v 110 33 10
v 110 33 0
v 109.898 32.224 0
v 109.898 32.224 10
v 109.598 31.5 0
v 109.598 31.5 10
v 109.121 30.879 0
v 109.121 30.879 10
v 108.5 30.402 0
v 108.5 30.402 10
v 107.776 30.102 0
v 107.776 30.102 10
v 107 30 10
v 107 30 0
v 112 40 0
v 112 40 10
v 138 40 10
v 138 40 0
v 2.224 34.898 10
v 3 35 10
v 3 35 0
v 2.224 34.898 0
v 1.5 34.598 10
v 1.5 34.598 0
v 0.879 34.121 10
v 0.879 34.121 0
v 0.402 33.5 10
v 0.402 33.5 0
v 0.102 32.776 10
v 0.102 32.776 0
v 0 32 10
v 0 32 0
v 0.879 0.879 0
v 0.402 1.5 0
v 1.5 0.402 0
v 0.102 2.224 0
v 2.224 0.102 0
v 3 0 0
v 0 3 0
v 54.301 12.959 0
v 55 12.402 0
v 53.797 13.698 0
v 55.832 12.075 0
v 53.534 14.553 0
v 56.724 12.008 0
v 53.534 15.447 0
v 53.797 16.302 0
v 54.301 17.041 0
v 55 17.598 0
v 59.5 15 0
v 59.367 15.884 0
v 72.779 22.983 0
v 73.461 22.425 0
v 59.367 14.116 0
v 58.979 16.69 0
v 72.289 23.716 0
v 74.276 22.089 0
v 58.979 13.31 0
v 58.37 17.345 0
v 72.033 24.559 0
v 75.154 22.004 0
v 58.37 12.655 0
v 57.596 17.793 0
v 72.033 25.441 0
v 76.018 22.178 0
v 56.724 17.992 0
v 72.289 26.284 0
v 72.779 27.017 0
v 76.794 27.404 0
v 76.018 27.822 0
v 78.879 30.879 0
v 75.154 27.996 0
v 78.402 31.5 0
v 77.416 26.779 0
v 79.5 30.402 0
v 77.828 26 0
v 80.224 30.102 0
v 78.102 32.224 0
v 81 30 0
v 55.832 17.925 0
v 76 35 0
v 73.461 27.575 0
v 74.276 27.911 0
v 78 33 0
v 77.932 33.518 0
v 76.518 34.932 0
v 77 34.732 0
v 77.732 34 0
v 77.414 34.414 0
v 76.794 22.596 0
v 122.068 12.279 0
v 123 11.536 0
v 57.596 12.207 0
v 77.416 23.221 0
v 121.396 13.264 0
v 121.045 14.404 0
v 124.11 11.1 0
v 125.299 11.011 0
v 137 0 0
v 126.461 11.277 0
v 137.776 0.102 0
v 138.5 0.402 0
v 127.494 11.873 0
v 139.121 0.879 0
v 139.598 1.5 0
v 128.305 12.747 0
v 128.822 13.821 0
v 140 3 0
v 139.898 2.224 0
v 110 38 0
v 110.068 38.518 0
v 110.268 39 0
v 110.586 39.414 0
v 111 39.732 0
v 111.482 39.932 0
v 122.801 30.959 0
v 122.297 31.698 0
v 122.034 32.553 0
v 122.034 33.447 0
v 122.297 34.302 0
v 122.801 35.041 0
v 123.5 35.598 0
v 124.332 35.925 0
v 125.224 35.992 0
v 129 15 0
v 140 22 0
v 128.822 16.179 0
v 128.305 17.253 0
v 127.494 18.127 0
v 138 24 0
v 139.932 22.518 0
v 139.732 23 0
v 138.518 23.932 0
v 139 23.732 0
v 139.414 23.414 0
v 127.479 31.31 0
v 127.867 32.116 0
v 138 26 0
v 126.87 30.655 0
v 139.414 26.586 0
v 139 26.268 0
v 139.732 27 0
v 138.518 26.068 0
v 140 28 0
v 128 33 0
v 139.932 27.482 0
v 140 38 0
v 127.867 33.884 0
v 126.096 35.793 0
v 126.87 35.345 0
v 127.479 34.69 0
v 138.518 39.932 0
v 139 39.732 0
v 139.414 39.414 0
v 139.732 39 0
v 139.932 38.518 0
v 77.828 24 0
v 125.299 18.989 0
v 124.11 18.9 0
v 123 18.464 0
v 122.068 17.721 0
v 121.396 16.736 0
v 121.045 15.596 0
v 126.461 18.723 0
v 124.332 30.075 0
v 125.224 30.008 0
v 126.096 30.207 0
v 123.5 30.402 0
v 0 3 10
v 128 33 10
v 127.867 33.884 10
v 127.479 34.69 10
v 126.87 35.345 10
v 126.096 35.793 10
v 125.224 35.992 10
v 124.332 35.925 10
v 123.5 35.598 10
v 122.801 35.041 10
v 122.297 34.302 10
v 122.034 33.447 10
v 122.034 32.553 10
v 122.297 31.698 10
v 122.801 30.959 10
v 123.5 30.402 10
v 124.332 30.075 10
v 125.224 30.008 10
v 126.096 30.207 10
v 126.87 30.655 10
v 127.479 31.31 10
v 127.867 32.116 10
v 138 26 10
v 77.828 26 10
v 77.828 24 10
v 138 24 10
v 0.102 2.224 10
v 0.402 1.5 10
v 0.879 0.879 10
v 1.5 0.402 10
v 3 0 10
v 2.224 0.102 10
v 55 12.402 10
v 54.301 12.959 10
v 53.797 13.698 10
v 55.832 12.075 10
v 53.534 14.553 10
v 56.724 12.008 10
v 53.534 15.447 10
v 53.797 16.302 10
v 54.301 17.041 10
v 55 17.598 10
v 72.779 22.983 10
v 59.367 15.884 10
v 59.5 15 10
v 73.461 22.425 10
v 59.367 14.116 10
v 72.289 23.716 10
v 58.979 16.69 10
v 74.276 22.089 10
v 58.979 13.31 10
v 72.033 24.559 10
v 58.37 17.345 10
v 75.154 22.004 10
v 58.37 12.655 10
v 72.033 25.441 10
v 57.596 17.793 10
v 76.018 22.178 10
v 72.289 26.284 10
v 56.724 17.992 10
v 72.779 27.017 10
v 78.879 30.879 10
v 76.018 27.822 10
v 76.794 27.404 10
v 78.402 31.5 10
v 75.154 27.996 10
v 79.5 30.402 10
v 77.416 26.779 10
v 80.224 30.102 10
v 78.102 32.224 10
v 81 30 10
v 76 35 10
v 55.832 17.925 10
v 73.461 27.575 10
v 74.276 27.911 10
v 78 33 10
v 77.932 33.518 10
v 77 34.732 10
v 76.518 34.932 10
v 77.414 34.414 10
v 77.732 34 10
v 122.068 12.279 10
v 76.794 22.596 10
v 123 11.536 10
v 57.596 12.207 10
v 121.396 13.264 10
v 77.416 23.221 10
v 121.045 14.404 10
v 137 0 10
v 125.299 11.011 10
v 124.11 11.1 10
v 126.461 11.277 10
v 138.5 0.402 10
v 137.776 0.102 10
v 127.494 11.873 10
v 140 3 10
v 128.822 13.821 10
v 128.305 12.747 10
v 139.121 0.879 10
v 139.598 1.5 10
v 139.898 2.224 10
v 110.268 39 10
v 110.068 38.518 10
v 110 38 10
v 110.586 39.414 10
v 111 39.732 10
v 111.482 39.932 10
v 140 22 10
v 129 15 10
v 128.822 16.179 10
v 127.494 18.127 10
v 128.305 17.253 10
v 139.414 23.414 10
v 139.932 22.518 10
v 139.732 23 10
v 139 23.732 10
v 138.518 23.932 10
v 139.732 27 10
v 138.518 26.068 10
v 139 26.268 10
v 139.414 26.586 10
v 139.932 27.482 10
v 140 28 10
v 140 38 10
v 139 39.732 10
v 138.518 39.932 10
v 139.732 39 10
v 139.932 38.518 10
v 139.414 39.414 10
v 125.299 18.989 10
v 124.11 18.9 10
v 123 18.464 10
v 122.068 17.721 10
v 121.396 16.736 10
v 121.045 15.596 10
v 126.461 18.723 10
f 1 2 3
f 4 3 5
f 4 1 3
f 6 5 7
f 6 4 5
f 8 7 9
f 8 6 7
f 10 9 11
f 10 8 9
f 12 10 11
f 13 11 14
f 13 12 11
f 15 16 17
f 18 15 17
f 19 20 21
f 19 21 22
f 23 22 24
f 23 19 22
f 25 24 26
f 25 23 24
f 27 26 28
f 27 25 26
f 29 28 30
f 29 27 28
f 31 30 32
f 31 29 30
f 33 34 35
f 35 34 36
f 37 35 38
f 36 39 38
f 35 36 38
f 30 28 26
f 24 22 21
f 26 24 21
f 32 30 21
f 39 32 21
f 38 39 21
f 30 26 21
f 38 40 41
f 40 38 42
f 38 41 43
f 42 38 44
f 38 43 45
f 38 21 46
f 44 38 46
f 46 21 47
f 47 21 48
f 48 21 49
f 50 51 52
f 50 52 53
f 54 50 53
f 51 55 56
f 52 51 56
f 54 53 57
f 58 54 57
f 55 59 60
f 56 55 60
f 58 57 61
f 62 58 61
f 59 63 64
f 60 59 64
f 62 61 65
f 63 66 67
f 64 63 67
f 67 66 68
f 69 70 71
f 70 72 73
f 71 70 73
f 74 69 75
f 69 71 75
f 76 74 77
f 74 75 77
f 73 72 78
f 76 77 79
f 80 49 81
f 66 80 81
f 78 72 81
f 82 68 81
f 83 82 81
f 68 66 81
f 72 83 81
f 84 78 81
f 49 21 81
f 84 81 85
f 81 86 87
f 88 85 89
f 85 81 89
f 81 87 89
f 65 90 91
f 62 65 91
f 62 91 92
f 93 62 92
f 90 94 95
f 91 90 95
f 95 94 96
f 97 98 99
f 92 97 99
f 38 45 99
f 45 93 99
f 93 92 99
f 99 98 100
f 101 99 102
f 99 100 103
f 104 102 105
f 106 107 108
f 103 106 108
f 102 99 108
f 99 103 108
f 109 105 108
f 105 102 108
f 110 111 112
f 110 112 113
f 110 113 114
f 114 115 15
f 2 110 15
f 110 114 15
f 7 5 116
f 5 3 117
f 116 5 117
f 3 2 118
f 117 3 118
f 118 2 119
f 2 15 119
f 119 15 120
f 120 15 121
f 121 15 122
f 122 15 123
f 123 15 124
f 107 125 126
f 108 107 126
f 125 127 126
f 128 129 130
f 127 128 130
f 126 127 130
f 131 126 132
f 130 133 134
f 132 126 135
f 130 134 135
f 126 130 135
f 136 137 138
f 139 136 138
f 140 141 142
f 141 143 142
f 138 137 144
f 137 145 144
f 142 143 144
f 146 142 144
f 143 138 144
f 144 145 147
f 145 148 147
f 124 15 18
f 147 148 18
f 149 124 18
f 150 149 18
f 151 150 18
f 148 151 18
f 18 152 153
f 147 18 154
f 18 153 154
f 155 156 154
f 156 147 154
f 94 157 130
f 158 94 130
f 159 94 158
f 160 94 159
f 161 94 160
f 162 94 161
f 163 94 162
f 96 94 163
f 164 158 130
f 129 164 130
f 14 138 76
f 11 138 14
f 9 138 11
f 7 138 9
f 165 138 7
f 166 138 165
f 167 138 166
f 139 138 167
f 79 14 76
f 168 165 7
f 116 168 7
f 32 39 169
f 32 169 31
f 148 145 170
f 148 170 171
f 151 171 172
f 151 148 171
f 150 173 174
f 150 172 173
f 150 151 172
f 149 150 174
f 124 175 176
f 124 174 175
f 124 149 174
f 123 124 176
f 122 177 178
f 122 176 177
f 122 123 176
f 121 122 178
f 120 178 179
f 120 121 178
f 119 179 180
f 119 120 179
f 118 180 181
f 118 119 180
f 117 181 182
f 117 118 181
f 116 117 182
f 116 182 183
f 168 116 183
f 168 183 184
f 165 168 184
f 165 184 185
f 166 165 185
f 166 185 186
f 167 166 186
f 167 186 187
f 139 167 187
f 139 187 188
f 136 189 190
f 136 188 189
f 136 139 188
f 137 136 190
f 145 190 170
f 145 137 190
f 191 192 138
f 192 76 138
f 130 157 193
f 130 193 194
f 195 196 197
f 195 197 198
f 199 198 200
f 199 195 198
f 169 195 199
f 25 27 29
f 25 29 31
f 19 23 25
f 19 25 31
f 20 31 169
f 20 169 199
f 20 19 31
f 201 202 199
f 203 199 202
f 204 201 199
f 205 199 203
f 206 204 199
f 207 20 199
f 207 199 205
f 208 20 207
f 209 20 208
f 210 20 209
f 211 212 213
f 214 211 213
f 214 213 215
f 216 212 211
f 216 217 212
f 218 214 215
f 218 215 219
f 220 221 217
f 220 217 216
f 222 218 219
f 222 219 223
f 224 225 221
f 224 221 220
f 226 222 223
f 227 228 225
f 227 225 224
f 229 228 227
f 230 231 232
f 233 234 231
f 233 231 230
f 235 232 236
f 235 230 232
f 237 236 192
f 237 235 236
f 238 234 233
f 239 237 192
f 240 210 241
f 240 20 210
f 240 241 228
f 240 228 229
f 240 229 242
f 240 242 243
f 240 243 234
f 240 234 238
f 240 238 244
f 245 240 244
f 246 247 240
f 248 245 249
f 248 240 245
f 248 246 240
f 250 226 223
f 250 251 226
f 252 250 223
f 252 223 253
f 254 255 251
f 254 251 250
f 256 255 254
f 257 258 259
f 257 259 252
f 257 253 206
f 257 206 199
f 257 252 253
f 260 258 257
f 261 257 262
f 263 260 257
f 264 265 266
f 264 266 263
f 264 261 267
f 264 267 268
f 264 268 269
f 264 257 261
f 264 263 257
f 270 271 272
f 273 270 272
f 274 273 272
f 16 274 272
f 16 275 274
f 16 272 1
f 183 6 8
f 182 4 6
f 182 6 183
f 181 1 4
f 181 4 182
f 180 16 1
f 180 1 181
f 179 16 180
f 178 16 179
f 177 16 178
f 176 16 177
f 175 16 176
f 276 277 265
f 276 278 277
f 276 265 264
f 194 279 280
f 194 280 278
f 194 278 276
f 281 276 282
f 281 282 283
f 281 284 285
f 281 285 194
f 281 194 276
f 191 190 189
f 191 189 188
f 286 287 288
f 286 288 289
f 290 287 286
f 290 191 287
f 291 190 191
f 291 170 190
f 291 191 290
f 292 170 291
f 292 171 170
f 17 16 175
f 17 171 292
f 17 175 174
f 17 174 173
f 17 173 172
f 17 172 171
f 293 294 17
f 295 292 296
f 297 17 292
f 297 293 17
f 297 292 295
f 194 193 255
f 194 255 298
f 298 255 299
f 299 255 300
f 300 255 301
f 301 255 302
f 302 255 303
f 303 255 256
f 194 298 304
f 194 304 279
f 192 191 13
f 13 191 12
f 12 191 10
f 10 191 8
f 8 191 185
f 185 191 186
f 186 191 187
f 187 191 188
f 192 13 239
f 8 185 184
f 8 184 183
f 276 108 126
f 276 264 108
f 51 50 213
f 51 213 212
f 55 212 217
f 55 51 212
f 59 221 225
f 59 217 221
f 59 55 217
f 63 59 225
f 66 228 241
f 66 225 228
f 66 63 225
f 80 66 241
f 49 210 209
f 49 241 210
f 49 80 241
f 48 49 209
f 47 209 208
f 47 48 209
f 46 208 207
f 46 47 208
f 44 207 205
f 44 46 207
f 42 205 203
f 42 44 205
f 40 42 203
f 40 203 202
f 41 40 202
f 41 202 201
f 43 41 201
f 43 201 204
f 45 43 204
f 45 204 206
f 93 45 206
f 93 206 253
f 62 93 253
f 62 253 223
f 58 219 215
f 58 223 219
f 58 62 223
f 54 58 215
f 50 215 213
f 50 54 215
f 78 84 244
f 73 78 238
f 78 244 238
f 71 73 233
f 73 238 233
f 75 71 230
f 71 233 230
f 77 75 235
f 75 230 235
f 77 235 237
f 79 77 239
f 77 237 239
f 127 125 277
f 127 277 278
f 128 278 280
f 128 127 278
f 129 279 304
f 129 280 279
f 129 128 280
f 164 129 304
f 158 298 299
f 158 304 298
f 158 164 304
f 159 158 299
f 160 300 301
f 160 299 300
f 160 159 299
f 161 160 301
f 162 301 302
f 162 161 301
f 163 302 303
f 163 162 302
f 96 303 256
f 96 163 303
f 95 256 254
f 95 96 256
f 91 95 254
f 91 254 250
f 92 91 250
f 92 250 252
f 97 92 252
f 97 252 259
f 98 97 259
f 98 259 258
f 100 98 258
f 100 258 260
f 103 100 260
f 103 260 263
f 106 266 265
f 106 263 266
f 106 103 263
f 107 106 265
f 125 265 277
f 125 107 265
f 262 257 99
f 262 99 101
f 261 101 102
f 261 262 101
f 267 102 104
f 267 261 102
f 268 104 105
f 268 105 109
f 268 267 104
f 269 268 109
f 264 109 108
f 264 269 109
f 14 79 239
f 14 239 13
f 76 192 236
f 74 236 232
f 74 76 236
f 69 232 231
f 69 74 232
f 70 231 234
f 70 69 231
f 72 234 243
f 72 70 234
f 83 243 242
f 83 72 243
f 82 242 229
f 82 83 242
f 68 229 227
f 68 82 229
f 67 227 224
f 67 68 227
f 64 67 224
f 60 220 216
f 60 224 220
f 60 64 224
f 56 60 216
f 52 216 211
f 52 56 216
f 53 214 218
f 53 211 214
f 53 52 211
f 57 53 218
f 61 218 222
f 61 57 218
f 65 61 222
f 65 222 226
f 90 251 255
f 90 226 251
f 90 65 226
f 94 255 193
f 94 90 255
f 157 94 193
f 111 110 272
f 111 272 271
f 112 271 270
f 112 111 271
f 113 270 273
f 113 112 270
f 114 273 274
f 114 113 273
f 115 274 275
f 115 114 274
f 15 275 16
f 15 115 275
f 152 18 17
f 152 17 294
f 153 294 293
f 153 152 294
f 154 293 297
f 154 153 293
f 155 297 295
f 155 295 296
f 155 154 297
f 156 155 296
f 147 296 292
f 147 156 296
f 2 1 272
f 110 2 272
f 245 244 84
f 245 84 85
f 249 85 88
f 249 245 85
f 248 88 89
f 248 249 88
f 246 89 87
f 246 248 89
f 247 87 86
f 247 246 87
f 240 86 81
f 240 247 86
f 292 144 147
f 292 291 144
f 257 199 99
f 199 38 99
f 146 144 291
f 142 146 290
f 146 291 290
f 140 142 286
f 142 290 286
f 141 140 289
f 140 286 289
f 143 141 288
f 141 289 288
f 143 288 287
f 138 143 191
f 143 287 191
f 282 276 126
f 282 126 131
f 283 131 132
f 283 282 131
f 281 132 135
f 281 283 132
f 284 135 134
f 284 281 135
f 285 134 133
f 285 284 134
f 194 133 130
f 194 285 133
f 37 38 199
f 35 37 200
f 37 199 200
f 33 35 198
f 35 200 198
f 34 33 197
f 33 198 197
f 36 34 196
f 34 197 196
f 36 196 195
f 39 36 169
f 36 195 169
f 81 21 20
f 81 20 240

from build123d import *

# Parameters (mm, degrees)
ESQUISSE1_W                  = 140
ESQUISSE1_H                  = 35
BOSS_EXTRU_1_DEPTH           = 30
ESQUISSE2_W                  = 33
ESQUISSE2_H                  = 35
ENL_V_MAT_EXTRU_1_DEPTH      = 20
ESQUISSE3_W                  = 30
ESQUISSE3_H                  = 5
BOSS_EXTRU_2_DEPTH           = 30
ENL_V_MAT_EXTRU_2_DEPTH      = 149.660687473
ENL_V_MAT_EXTRU_2_DEPTH_BACK = 149.660687473
ESQUISSE4_R                  = 3
ENL_V_MAT_EXTRU_3_DEPTH      = 149.660687473
ENL_V_MAT_EXTRU_3_DEPTH_BACK = 149.660687473
ESQUISSE5_W                  = 65
ESQUISSE5_H                  = 2
ENL_V_MAT_EXTRU_4_DEPTH      = 149.660687473
ENL_V_MAT_EXTRU_4_DEPTH_BACK = 149.660687473
ESQUISSE6_W                  = 32
ESQUISSE6_H                  = 5
CONG_1_R                     = 3
ENL_V_MAT_EXTRU_6_DEPTH      = 15
ENL_V_MAT_EXTRU_5_DEPTH      = 149.660687473
ENL_V_MAT_EXTRU_5_DEPTH_BACK = 149.660687473
ESQUISSE7_R                  = 4
CONG_2_R                     = 3
CONG_3_R                     = 2
ENL_V_MAT_EXTRU_8_DEPTH      = 149.660687473
ENL_V_MAT_EXTRU_8_DEPTH_BACK = 149.660687473
ESQUISSE10_R                 = 3
ESQUISSE9_W                  = 140
ESQUISSE9_H                  = 40
ENL_V_MAT_EXTRU_7_DEPTH      = 20


with BuildPart() as part:
    # Esquisse1 → Boss.-Extru.1 (new body)
    with BuildSketch(Plane.XY):
        with Locations((70, 17.5)):
            Rectangle(ESQUISSE1_W, ESQUISSE1_H)
    extrude(amount=BOSS_EXTRU_1_DEPTH)

    # Esquisse2 → Enlèv. mat.-Extru.1 (cut)
    with BuildSketch(Plane.XY.offset(30)):
        with Locations((25, 17.5)):
            Rectangle(ESQUISSE2_W, ESQUISSE2_H)
    extrude(amount=-ENL_V_MAT_EXTRU_1_DEPTH, mode=Mode.SUBTRACT)

    # Esquisse3 → Boss.-Extru.2 (add)
    with BuildSketch(Plane.XY.offset(30)):
        with Locations((125, 37.5)):
            Rectangle(ESQUISSE3_W, ESQUISSE3_H)
    extrude(amount=-BOSS_EXTRU_2_DEPTH)

    # Esquisse4 → Enlèv. mat.-Extru.2 (cut, two sides: drawn at the far end of the back side and taken through both)
    with BuildSketch(Plane.XY.offset(30).offset(-ENL_V_MAT_EXTRU_2_DEPTH_BACK)):
        with Locations((75, 25)):
            Circle(ESQUISSE4_R)
    extrude(amount=ENL_V_MAT_EXTRU_2_DEPTH + ENL_V_MAT_EXTRU_2_DEPTH_BACK, mode=Mode.SUBTRACT)

    # Esquisse5 → Enlèv. mat.-Extru.3 (cut, two sides: drawn at the far end of the back side and taken through both)
    with BuildSketch(Plane.XY.offset(30).offset(-ENL_V_MAT_EXTRU_3_DEPTH_BACK)):
        with Locations((107.5, 25)):
            Rectangle(ESQUISSE5_W, ESQUISSE5_H)
    extrude(amount=ENL_V_MAT_EXTRU_3_DEPTH + ENL_V_MAT_EXTRU_3_DEPTH_BACK, mode=Mode.SUBTRACT)

    # Esquisse6 → Enlèv. mat.-Extru.4 (cut, two sides: drawn at the far end of the back side and taken through both)
    with BuildSketch(Plane.XY.offset(30).offset(-ENL_V_MAT_EXTRU_4_DEPTH_BACK)):
        with Locations((94, 32.5)):
            Rectangle(ESQUISSE6_W, ESQUISSE6_H)
    extrude(amount=ENL_V_MAT_EXTRU_4_DEPTH + ENL_V_MAT_EXTRU_4_DEPTH_BACK, mode=Mode.SUBTRACT)

    # Congé1
    cong_1_edges = [part.edges().sort_by_distance(p)[0] for p in [
        (78, 30, 15),
        (110, 30, 15),
    ]]
    fillet(cong_1_edges, radius=CONG_1_R)

    # Esquisse8 → Enlèv. mat.-Extru.6 (cut)
    with BuildSketch(Plane.XY.offset(30)):
        Polygon((72, 0), (140, 0), (140, 24), (106.275552162, 24), align=None)
    extrude(amount=-ENL_V_MAT_EXTRU_6_DEPTH, mode=Mode.SUBTRACT)

    # Esquisse7 → Enlèv. mat.-Extru.5 (cut, two sides: drawn at the far end of the back side and taken through both)
    with BuildSketch(Plane.XY.offset(30).offset(-ENL_V_MAT_EXTRU_5_DEPTH_BACK)):
        with Locations((125, 15)):
            Circle(ESQUISSE7_R)
    extrude(amount=ENL_V_MAT_EXTRU_5_DEPTH + ENL_V_MAT_EXTRU_5_DEPTH_BACK, mode=Mode.SUBTRACT)

    # Congé2
    cong_2_edges = [part.edges().sort_by_distance(p)[0] for p in [
        (140, 0, 7.5),
        (72, 0, 22.5),
        (0, 35, 15),
        (0, 0, 15),
    ]]
    fillet(cong_2_edges, radius=CONG_2_R)

    # Congé3
    cong_3_edges = [part.edges().sort_by_distance(p)[0] for p in [
        (106.275552162, 24, 22.5),
        (8.5, 0, 20),
        (8.5, 35, 20),
        (41.5, 35, 20),
        (41.5, 0, 20),
        (110, 40, 15),
        (140, 40, 15),
        (140, 26, 15),
        (140, 24, 7.5),
        (78, 35, 15),
    ]]
    fillet(cong_3_edges, radius=CONG_3_R - 0.0001)  # a hair under: the kernel refuses the full size

    # Esquisse10 → Enlèv. mat.-Extru.8 (cut, two sides: drawn at the far end of the back side and taken through both)
    with BuildSketch(Plane.XY.offset(30).offset(-ENL_V_MAT_EXTRU_8_DEPTH_BACK)):
        with Locations((56.5, 15)):
            Circle(ESQUISSE10_R)
        with Locations((125, 33)):
            Circle(ESQUISSE10_R)
    extrude(amount=ENL_V_MAT_EXTRU_8_DEPTH + ENL_V_MAT_EXTRU_8_DEPTH_BACK, mode=Mode.SUBTRACT)

    # Esquisse9 → Enlèv. mat.-Extru.7 (cut)
    with BuildSketch(Plane.XY.offset(30)):
        with Locations((70, 20)):
            Rectangle(ESQUISSE9_W, ESQUISSE9_H)
    extrude(amount=-ENL_V_MAT_EXTRU_7_DEPTH, mode=Mode.SUBTRACT)


solid = part.part
